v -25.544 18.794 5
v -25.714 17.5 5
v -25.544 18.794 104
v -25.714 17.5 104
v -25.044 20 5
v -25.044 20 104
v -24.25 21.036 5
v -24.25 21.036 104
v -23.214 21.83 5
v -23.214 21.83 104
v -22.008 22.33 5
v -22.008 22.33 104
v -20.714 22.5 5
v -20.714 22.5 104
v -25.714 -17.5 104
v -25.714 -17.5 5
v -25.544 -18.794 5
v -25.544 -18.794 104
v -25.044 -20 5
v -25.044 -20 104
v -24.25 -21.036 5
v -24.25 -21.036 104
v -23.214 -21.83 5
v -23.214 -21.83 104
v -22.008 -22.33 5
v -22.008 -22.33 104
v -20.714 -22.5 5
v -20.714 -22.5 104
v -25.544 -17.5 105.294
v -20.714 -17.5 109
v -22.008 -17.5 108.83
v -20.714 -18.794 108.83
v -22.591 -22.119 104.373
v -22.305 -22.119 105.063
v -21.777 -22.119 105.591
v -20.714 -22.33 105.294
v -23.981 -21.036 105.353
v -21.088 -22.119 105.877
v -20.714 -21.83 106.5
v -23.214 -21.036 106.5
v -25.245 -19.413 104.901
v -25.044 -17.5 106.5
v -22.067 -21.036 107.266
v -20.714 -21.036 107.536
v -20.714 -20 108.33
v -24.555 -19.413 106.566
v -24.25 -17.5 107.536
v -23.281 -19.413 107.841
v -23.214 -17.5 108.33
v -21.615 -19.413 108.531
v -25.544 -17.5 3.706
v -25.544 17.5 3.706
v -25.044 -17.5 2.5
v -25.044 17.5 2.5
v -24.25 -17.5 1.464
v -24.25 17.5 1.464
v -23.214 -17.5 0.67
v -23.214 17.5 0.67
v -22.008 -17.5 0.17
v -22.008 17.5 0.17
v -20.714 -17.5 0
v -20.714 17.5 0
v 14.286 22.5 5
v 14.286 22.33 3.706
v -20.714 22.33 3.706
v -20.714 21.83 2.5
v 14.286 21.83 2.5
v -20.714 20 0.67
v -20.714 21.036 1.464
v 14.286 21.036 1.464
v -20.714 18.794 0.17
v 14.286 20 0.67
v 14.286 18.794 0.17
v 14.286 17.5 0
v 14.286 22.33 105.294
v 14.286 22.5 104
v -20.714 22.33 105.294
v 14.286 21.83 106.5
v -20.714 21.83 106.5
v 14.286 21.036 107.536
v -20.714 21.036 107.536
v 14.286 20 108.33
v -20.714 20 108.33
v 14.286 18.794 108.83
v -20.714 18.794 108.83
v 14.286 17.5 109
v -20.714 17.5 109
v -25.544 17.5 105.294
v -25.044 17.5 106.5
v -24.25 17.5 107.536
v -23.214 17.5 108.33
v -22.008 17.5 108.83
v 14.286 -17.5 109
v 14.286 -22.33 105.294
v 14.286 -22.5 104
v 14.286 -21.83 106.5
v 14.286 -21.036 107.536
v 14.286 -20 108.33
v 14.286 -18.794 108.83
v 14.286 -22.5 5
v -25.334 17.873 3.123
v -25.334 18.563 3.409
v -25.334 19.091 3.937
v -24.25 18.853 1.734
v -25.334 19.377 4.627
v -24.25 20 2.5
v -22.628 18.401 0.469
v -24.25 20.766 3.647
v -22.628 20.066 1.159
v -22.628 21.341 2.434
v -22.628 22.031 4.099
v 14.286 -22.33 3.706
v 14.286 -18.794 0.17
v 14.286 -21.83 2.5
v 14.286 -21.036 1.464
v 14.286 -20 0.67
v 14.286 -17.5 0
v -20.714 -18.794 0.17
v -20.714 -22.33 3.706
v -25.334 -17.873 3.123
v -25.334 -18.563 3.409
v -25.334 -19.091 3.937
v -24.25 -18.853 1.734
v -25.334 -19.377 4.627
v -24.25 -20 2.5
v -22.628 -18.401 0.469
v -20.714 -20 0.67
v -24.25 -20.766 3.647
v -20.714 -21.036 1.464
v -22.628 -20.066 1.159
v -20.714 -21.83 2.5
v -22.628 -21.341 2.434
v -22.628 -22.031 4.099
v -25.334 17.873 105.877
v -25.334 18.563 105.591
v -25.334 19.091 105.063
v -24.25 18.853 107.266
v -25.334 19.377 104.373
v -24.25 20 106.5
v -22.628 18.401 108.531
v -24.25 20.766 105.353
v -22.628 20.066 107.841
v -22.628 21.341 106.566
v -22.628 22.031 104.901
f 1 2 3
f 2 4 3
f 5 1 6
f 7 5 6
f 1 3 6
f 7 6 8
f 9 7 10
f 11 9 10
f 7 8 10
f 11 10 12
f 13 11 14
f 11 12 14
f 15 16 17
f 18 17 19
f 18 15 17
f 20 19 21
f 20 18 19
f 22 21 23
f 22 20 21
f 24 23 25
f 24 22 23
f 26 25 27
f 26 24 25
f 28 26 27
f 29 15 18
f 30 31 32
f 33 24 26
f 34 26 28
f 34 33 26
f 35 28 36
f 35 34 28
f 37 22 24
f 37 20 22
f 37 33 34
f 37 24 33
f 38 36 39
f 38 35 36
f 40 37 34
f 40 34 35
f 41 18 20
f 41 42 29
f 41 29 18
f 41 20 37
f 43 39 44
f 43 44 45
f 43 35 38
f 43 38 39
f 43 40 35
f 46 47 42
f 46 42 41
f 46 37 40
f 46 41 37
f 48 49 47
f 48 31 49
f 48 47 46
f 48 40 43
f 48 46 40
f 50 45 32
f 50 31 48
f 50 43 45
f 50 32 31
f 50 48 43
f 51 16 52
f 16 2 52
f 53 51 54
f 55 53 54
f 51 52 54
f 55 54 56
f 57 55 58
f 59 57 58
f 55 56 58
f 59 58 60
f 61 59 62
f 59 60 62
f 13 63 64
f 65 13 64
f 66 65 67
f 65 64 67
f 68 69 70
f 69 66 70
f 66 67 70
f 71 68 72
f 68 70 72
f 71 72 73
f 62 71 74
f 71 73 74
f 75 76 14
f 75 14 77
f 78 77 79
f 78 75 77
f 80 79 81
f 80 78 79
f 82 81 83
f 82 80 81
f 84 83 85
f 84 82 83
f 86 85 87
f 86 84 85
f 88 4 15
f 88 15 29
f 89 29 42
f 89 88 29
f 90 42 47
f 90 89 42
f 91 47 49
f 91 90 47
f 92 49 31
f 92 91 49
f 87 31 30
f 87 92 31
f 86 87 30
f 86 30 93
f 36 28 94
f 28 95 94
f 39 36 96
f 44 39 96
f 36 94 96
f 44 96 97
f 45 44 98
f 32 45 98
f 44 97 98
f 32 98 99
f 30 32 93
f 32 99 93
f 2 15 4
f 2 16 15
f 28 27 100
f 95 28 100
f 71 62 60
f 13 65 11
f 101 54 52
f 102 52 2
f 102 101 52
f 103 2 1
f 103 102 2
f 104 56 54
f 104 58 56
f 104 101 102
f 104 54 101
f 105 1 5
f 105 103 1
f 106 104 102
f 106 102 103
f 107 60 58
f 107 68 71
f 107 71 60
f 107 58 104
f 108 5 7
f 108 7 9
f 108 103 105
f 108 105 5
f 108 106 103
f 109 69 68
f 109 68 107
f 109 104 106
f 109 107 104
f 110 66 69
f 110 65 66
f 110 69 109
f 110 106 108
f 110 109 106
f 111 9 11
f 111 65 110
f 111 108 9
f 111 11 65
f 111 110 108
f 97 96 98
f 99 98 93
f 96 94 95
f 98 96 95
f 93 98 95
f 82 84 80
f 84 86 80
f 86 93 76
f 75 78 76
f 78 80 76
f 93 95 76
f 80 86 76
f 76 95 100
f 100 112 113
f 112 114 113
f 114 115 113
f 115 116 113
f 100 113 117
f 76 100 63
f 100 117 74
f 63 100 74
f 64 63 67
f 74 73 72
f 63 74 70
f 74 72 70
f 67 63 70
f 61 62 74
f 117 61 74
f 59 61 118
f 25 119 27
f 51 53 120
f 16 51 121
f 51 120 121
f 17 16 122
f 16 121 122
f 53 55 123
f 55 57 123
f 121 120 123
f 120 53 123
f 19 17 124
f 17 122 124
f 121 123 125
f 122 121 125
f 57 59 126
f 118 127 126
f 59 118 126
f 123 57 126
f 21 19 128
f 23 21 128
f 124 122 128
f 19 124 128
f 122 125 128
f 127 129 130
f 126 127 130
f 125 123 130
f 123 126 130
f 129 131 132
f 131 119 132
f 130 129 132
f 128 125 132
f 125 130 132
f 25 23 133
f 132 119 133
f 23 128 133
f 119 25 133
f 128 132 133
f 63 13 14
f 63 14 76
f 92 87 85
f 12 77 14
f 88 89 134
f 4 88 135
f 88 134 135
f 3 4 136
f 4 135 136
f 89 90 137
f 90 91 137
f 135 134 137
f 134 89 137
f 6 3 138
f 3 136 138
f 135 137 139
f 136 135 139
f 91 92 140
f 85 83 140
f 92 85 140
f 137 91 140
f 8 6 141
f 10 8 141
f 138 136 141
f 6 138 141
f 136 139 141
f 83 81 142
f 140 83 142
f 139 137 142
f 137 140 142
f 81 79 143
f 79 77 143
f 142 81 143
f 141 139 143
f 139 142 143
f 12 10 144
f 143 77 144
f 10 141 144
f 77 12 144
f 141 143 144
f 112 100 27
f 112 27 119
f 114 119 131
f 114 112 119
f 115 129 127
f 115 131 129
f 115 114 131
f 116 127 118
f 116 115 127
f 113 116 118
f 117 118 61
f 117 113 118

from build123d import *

# Parameters (mm, degrees)
SKETCH_1_W             = 40
SKETCH_1_H             = 45
EXTRUDE_80_70_70_DEPTH = 109
FILLET_2_R             = 5


with BuildPart() as part:
    # 草图1 → 80横向_70纵向_70竖向 (new body)
    with BuildSketch(Plane.XY):
        with Locations((-5.714285714, 0)):
            Rectangle(SKETCH_1_W, SKETCH_1_H)
    extrude(amount=EXTRUDE_80_70_70_DEPTH)

    # 圆角2
    fillet_2_edges = [part.edges().sort_by_distance(p)[0] for p in [
        (-5.714285714, 22.5, 109),
        (-25.714285714, 0, 109),
        (-5.714285714, 22.5, 0),
        (-5.714285714, -22.5, 0),
        (-25.714285714, 0, 0),
        (-25.714285714, 22.5, 54.5),
        (-25.714285714, -22.5, 54.5),
        (-5.714285714, -22.5, 109),
    ]]
    fillet(fillet_2_edges, radius=FILLET_2_R)


solid = part.part
